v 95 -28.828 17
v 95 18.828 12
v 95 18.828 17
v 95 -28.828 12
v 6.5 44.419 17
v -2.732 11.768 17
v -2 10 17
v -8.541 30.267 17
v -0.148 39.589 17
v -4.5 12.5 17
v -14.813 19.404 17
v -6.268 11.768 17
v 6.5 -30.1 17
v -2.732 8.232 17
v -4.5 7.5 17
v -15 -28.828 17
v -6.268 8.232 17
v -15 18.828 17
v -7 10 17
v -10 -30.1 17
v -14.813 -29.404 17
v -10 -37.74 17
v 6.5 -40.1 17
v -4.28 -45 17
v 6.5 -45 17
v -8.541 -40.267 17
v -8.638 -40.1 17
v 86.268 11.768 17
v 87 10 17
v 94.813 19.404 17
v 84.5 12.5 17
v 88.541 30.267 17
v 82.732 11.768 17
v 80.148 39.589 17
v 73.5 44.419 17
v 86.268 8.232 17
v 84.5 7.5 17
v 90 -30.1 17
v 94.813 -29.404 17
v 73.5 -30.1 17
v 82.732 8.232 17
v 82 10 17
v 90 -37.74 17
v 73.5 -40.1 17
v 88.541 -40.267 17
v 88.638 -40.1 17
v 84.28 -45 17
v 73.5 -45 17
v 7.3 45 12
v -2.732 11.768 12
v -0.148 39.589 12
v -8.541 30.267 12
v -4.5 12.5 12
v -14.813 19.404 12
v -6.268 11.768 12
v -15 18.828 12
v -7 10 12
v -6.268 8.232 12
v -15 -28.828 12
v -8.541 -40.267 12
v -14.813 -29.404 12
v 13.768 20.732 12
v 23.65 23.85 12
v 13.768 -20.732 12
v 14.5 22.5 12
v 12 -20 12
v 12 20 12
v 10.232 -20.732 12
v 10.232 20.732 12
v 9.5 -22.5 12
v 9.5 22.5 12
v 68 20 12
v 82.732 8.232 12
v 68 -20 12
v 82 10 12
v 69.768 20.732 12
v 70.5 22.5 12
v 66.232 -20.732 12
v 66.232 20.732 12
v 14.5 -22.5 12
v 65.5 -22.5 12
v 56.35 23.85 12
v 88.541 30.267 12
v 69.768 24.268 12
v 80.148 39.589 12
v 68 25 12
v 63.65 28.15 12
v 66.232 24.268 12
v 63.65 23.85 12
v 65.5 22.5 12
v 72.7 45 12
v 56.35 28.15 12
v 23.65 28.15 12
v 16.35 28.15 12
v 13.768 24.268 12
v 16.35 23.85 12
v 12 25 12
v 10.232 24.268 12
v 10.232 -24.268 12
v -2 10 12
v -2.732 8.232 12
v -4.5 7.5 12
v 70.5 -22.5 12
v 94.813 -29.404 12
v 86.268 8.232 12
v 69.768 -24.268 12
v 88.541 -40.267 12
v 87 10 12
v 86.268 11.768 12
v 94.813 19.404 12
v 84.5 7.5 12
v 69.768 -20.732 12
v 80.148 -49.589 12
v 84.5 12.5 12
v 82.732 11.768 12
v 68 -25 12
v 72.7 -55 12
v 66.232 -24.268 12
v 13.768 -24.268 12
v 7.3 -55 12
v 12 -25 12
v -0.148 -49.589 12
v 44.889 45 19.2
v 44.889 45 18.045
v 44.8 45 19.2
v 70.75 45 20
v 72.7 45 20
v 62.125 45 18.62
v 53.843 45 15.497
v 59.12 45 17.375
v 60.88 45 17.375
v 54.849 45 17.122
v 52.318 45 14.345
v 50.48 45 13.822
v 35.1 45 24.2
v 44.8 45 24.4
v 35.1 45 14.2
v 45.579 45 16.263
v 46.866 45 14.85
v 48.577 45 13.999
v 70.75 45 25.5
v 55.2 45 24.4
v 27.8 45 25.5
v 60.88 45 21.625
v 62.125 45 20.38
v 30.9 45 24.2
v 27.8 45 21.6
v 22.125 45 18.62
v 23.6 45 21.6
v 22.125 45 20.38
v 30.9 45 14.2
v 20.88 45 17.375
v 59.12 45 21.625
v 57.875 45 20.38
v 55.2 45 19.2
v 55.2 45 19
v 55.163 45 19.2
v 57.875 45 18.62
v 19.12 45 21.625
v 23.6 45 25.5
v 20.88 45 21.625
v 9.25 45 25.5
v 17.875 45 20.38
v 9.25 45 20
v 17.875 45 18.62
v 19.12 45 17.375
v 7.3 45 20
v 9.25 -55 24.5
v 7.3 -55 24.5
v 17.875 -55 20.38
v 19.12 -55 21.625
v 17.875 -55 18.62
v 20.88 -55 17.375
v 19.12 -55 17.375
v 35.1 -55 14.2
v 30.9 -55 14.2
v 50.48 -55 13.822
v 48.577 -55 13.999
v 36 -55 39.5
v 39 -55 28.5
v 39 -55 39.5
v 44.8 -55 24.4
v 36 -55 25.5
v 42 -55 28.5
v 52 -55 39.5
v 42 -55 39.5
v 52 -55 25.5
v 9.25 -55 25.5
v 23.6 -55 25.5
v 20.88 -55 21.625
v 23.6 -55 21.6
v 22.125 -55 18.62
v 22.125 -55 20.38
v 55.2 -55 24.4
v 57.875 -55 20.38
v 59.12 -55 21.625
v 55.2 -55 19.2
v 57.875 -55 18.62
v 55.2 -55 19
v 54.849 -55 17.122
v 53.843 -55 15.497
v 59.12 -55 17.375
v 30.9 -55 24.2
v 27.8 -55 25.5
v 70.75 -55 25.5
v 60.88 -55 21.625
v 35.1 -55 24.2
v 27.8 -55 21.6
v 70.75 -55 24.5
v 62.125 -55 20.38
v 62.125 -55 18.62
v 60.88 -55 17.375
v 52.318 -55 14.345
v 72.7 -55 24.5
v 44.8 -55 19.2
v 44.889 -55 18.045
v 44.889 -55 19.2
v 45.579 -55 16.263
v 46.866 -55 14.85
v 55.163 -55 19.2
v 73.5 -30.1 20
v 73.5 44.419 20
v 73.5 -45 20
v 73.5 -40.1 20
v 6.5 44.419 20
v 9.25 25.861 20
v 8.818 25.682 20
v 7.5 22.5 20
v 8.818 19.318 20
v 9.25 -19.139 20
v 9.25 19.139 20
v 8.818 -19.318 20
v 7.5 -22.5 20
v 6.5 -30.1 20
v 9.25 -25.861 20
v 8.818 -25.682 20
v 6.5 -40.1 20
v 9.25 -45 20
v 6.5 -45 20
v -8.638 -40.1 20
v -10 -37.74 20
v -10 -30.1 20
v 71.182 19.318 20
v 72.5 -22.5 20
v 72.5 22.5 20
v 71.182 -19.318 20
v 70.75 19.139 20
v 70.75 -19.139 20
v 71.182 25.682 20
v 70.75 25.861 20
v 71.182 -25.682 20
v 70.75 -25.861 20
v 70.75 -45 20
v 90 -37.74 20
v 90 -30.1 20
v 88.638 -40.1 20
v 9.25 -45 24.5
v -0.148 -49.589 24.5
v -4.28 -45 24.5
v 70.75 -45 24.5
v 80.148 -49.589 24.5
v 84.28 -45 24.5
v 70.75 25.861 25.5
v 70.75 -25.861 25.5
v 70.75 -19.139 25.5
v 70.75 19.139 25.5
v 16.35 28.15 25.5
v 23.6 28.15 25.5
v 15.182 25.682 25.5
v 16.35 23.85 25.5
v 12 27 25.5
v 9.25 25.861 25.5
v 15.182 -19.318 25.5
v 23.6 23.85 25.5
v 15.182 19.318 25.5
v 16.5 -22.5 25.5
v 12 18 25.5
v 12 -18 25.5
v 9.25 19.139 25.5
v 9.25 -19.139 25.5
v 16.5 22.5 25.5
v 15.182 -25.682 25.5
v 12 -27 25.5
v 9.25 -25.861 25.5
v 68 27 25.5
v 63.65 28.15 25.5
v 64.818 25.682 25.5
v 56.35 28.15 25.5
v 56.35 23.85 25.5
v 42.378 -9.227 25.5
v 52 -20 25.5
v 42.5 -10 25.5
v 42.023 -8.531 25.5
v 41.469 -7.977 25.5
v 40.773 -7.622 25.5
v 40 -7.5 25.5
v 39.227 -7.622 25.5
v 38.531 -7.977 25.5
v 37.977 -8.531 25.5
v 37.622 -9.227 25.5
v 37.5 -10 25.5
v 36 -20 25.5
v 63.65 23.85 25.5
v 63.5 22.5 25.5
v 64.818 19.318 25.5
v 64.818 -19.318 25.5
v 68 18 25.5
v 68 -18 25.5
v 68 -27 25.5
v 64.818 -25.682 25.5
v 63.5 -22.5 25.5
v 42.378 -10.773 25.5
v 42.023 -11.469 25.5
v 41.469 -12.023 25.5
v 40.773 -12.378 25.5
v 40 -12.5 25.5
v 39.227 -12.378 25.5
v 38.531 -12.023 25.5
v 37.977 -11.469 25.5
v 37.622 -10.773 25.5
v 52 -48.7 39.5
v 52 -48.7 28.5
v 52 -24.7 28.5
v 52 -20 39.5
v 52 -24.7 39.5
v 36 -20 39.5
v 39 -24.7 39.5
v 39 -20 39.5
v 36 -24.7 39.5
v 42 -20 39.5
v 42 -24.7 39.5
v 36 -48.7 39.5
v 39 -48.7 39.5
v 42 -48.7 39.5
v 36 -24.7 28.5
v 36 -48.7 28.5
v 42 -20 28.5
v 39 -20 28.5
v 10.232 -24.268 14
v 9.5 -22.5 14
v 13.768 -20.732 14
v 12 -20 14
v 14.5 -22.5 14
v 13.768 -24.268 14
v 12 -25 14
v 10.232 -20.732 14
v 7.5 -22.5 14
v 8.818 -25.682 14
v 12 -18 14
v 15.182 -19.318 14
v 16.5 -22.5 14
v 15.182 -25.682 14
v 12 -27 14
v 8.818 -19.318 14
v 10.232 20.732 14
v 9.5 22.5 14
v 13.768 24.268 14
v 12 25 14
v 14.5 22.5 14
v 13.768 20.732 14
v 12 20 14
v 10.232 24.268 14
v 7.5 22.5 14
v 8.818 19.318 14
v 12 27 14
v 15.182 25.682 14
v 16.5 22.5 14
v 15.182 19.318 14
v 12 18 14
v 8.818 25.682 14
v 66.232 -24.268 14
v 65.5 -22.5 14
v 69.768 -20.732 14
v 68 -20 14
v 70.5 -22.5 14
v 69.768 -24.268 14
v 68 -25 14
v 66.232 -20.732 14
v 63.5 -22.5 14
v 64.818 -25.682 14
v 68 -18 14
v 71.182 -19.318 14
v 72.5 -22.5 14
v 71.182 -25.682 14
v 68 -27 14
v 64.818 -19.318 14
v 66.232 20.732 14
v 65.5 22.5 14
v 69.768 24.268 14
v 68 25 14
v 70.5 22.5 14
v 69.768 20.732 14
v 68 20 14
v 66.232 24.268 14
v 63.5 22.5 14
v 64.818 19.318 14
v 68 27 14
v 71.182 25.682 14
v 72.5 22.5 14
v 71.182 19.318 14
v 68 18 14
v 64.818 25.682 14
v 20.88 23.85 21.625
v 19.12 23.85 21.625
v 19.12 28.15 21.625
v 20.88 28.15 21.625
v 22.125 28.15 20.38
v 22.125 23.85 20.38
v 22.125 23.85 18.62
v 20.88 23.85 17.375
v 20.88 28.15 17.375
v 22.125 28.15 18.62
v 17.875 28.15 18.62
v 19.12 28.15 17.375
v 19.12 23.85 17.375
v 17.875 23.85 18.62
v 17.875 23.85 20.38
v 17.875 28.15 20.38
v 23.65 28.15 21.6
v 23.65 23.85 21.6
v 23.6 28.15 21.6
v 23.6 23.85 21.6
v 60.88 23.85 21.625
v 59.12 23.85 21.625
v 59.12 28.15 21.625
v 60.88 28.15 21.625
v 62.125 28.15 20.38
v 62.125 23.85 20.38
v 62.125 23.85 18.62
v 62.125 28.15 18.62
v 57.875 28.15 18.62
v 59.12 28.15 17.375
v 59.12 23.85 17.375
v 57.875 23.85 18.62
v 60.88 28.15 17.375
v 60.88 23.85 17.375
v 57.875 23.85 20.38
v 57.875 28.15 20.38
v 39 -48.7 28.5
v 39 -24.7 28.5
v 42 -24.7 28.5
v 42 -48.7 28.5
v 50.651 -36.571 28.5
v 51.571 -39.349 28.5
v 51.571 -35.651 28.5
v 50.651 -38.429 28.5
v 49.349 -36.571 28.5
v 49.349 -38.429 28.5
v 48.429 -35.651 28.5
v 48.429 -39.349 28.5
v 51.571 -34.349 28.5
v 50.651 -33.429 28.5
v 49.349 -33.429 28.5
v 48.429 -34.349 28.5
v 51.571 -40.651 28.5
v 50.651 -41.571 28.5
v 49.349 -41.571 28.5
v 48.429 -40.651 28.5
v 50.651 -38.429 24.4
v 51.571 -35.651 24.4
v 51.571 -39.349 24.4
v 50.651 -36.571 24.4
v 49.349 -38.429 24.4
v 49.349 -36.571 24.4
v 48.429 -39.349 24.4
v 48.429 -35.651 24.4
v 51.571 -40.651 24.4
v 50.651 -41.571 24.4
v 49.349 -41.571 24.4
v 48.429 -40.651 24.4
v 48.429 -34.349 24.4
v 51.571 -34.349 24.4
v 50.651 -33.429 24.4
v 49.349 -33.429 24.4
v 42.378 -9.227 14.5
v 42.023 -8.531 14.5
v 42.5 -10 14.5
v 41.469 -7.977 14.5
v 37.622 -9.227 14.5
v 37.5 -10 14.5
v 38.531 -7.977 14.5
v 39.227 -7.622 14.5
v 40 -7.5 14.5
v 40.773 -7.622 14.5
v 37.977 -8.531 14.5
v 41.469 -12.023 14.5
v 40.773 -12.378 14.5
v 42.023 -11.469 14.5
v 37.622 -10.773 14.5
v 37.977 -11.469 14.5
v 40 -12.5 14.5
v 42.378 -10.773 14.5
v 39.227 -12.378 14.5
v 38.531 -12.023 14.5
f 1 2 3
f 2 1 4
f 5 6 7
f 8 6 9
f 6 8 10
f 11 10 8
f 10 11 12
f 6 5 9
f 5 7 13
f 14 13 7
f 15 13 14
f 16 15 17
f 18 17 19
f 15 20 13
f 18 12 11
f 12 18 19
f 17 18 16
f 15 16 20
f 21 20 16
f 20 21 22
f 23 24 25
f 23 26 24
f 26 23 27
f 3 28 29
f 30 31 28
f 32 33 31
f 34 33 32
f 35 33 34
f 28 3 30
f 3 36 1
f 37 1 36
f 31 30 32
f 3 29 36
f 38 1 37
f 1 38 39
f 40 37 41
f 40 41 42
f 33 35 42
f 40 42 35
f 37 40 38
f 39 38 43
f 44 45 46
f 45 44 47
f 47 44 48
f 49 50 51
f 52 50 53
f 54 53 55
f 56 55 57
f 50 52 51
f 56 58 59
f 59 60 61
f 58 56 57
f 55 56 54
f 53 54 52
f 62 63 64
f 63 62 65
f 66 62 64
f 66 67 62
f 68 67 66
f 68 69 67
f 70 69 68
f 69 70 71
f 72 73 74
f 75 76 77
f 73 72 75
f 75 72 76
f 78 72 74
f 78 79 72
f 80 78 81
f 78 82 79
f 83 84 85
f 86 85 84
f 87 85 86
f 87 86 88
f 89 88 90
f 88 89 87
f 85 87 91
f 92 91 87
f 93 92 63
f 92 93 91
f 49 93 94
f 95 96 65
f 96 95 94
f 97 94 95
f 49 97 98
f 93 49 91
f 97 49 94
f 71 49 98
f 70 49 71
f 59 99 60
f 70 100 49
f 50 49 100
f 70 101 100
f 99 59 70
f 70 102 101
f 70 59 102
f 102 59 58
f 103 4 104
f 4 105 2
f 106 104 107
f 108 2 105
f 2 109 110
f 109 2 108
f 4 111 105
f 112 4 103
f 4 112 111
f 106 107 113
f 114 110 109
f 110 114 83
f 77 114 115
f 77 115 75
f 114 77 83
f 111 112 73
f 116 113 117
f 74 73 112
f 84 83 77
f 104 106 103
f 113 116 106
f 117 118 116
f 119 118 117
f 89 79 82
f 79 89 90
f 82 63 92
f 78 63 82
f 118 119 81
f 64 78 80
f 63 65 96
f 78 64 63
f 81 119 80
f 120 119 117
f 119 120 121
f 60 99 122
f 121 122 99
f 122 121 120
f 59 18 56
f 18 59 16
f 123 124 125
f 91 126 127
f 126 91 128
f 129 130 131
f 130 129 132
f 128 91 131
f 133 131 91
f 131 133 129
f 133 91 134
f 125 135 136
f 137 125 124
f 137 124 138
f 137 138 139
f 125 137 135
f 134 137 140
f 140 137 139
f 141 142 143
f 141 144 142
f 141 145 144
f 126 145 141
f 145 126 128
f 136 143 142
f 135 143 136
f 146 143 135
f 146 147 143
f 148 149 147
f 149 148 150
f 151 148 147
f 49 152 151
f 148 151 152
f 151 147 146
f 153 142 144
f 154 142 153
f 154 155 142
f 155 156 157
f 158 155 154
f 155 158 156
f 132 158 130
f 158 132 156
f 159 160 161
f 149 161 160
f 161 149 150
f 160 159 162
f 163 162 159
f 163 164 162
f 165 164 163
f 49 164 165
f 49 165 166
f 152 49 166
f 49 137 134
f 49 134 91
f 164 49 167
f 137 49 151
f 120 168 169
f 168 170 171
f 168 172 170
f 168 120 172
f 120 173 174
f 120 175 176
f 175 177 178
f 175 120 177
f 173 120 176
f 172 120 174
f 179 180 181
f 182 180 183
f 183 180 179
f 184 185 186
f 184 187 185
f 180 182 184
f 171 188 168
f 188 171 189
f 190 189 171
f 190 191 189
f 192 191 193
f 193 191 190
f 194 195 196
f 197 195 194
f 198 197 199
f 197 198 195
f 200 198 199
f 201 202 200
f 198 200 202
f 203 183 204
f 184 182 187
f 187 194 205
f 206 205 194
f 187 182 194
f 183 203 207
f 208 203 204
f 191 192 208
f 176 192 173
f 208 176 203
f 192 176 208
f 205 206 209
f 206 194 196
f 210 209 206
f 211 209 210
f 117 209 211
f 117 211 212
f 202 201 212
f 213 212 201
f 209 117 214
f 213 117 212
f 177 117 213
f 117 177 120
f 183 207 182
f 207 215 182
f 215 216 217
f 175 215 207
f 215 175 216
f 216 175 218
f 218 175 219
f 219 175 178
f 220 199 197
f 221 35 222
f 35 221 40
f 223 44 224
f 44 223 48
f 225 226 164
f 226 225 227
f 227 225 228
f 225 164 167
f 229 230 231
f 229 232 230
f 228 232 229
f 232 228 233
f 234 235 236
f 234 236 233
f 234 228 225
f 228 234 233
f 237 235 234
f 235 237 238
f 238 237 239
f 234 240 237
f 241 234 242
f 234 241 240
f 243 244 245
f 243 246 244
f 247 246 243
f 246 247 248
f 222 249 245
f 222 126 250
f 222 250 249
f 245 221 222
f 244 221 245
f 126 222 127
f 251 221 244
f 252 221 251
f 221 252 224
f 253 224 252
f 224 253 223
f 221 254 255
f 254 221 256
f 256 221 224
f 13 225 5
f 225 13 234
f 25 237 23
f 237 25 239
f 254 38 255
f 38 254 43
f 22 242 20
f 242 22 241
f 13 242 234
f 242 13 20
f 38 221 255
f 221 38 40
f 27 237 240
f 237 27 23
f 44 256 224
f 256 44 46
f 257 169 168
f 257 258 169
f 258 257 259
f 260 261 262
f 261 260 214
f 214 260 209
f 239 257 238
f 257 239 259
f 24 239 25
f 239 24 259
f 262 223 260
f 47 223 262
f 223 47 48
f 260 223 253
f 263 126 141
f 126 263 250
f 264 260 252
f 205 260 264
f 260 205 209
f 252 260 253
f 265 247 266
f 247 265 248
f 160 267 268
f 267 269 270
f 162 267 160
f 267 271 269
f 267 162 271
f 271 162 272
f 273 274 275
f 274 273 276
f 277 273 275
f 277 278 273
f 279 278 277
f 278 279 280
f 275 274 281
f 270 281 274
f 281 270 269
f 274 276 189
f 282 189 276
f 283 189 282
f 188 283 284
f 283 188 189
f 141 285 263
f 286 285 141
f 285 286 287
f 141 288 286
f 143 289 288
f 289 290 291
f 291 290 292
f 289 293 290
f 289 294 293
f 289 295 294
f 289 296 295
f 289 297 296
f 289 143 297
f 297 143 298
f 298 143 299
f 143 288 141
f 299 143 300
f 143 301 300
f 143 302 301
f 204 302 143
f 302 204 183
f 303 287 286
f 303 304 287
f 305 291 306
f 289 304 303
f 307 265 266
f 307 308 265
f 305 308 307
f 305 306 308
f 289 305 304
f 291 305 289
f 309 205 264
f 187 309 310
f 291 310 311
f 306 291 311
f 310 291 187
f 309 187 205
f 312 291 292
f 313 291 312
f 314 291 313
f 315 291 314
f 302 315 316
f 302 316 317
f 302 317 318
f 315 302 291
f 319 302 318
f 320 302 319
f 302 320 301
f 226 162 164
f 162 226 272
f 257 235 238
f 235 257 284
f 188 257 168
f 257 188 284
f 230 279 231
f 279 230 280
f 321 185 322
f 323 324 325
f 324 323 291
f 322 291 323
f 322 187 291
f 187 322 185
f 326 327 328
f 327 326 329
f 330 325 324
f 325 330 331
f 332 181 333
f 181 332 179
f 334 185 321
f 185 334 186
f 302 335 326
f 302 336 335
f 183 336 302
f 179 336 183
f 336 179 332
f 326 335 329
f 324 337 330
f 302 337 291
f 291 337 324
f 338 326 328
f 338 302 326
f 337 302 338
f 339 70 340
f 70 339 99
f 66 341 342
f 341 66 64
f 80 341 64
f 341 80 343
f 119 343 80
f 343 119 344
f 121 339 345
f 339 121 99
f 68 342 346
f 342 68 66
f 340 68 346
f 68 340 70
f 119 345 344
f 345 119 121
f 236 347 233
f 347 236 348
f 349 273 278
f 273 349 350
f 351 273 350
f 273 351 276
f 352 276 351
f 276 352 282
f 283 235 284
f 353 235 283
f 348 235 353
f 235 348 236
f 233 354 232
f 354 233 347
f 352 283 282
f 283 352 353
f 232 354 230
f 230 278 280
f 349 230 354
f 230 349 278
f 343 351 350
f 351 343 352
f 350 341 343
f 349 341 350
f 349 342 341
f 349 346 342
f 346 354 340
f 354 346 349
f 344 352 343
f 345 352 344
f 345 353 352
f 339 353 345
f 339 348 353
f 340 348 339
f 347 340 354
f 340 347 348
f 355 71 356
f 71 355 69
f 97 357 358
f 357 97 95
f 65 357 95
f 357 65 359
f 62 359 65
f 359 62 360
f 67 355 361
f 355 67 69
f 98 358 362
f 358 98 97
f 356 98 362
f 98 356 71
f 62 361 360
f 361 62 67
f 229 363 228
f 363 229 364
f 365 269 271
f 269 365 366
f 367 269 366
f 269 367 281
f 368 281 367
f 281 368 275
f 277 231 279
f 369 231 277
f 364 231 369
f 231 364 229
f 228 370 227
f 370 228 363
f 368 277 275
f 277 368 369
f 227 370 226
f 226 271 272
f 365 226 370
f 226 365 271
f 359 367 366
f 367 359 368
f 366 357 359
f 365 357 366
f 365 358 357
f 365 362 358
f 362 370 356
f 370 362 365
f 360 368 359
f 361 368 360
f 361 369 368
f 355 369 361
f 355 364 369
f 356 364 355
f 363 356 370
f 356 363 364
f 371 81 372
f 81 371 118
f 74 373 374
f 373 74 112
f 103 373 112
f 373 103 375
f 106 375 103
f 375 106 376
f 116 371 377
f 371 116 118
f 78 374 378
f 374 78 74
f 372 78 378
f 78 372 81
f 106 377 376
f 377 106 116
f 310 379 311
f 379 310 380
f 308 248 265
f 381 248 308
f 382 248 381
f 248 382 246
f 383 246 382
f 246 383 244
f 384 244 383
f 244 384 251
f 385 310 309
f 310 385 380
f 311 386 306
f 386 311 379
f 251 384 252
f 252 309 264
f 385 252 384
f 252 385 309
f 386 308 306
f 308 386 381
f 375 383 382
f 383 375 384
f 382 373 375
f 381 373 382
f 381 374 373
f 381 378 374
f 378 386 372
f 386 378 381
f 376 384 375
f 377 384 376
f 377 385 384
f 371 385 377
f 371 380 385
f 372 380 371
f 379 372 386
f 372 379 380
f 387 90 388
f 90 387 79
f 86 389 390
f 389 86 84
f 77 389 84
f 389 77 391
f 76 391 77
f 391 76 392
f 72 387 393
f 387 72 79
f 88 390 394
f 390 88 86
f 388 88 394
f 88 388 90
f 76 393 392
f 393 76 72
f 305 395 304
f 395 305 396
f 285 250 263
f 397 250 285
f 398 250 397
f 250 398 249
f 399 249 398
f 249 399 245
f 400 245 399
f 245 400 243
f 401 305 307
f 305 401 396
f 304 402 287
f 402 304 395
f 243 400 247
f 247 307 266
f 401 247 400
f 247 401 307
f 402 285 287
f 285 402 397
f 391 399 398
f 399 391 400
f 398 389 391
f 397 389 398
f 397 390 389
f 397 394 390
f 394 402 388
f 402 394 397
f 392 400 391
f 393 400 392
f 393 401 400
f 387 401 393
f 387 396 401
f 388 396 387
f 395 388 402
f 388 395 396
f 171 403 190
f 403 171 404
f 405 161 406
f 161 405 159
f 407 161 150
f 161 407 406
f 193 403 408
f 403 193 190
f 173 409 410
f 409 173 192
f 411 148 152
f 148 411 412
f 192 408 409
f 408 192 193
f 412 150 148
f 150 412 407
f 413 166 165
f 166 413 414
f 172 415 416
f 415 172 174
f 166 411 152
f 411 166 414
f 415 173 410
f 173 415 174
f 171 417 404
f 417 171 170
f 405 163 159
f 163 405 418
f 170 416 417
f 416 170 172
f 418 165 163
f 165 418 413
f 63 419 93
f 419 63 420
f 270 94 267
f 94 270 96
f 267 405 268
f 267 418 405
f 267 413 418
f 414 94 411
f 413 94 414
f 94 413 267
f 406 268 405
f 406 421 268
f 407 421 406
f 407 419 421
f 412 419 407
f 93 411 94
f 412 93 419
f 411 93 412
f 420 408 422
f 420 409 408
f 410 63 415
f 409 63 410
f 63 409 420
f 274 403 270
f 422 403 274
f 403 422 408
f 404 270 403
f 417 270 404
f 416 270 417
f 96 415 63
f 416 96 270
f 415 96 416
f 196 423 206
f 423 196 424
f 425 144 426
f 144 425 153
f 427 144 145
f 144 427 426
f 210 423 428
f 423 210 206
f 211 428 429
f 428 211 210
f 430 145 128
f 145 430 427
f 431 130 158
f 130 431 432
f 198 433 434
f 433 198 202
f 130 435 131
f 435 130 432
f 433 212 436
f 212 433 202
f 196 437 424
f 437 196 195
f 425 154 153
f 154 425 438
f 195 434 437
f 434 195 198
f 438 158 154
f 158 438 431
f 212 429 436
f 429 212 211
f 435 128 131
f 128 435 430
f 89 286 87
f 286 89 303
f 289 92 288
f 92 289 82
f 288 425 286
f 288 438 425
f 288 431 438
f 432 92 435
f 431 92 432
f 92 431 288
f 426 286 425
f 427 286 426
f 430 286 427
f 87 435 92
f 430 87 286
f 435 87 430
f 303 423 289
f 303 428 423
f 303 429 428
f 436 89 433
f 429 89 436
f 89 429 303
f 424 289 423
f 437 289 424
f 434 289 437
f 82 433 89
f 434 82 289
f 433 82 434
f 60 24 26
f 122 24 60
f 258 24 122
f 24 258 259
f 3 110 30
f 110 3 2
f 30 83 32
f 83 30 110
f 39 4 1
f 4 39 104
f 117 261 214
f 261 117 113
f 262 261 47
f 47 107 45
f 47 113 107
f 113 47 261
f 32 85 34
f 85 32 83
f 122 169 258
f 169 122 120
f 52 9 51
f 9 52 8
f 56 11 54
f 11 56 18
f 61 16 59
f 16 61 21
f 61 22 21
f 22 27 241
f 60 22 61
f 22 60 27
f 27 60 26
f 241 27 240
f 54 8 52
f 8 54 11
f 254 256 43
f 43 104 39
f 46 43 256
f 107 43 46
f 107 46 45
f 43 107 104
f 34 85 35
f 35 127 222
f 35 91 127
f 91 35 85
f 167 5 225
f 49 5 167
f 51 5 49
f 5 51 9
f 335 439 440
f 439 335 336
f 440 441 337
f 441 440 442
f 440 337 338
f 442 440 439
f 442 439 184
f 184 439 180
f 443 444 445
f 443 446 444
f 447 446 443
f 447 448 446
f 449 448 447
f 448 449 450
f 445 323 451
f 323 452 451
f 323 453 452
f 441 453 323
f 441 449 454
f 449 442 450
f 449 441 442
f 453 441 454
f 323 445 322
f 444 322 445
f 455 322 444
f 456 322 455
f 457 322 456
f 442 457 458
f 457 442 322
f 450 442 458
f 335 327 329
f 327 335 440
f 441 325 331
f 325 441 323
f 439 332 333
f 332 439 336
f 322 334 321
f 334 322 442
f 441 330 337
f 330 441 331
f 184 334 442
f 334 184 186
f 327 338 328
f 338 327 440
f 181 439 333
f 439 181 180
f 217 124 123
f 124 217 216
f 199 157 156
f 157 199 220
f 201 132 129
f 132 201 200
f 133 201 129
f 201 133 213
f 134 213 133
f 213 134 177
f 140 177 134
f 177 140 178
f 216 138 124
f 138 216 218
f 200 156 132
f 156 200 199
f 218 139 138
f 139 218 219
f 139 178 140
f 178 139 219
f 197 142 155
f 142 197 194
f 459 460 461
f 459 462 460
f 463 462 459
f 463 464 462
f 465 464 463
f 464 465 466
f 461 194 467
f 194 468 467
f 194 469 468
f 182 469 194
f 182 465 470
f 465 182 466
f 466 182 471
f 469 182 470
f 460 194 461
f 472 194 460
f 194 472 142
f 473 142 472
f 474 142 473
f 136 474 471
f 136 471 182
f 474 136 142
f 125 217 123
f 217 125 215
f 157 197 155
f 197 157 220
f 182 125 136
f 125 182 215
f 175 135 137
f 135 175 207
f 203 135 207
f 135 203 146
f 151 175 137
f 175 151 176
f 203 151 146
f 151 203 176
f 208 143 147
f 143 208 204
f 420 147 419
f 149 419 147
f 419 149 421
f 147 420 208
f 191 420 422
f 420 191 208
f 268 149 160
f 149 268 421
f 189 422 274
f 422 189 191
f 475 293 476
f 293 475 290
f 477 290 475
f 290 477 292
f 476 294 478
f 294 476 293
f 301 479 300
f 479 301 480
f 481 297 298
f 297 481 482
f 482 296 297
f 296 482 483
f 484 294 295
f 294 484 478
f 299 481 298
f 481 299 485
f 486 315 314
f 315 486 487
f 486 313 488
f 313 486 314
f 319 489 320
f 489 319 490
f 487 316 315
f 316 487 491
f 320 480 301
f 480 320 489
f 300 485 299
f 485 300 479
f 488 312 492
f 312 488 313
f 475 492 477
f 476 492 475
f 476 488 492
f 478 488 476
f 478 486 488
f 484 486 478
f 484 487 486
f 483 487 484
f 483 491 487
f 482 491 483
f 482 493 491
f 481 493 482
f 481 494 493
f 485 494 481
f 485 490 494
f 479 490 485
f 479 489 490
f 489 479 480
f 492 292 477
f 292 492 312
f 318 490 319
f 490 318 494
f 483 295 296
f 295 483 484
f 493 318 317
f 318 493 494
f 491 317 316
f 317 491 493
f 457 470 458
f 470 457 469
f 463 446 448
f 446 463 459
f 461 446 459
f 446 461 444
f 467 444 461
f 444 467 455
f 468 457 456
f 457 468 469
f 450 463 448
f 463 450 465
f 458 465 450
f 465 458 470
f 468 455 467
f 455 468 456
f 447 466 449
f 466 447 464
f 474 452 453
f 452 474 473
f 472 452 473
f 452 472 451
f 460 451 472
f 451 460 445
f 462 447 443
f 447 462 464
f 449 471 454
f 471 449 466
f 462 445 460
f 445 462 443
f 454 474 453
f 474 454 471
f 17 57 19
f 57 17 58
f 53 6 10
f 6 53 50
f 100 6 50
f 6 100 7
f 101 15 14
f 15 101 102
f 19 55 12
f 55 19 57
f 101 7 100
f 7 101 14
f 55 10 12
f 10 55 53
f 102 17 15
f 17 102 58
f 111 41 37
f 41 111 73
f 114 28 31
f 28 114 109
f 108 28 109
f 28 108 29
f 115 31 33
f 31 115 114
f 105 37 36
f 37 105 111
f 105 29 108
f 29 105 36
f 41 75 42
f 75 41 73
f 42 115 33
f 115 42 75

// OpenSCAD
// file: ymotor.scad
use <extrusions.scad>
xpos=0;
ypos=0;

module ymotor(){mirror([0,0,1])difference(){translate([0,-20,0])cube([42,75,5]);
translate([-20,20,-1])cube([42,75,8]);
#translate([21,1,0])nema17(true);
%translate([32,22,-40])rotate([90,0,90])profile8020(160);
for(j=[0,20])translate([32,30+j,2])mirror([0,0,0])rotate([0,0,360/16]){cylinder(r=2.5,h=30,center=true,$fn=8);
cylinder(r=4.5,h=30,$fn=8);
}
}
}
rotate([0,180,0])ymotor();

*translate([21.5,90,6])rotate([0,0,-90])yidler();

module yidler(){
translate([0,2.5,-16])difference(){
union(){translate([0,2,-2])cube([15,32,24],true);
translate([0,-2,5])cube([38,20,5]);
#translate([0,8,11.5])rotate([90,0,0])difference(){cube([15,5,19],true);
translate([0,-19.51,0]){translate([0,18.5,12.5])cube([31,3,21],true);
translate([0,20,15.5])cube([31,3,21],true);
translate([0,18.5,-12.5])cube([31,3,21],true);
translate([0,20,-15.5])cube([31,3,21],true);
translate([0,22.5,0])cube([31,3,21],true);
}
}

}
translate([0,-3,-4])cube([17,18,11],true);
#translate([0,-3,-1])mirror([0,0,1]){rotate([0,0,22.5])cylinder(r=2.5,h=20,center=true,$fn=8);
translate([0,0,11.6])rotate([0,0,22.5])cylinder(r=4.5,h=4,center=true,$fn=8);}

for(i=[15,30])#translate([i,10.5,18])mirror([0,0,1]){translate([0,-2.5,0])rotate([0,0,22.5])cylinder(r=2.5,h=20,center=true,$fn=8);
translate([0,-2.5,11.6])rotate([0,0,22.5])cylinder(r=4.5,h=4,center=true,$fn=8);}
}
}

module yidleranchor(){
translate([6,0,-16])difference(){
cube([30,39,19],true);
translate([7,-3,0])cube([30,39,10],true);
translate([14,-10,0])rotate([0,0,-35])cube([30,49,22],true);
for(i=[0,10])translate([i,23.7,0])rotate([90,0,0]){
translate([0,0,0])rotate([0,0,22.5])cylinder(r=2.5,h=20,center=true,$fn=8);
translate([0,0,7.6])rotate([0,0,22.5])cylinder(r=4.5,h=4,center=true,$fn=8);
}
for(i=[14,-14])translate([-17.4,i-2,-1])rotate([0,90,0]){
translate([0,0,0])rotate([0,0,22.5])cylinder(r=2.5,h=20,center=true,$fn=8);
translate([0,0,7.6])rotate([0,0,22.5])cylinder(r=4.5,h=4,center=true,$fn=8);
}

}

}



translate([0,0,7.5])rotate([0,-90,0])yidler();

*translate([120,0,3])rotate([0,-90,0])yidleranchor();
// file: extrusions.scad
module Islot5(l=100){
translate([l/2,0,0]){cube([l,5,6.6],center=true);
translate([0,0,1])hull(){
cube([l,5,4.5],center=true);
translate([0,0,-1.5])cube([l,11,1.5],center=true);
}
}
}

module rcorner(r,l){
translate([l/2,0,0])difference(){
cube([l,r*2,r*2],center=true);
for(i=[-1,1])for(j=[-1,1])translate([0,i*r,j*r])rotate([0,90,0])cylinder(r=r,h=l+1,$fn=20,center=true);
}
}


module profilex020(l=100,x=4){
xwidth=x*10;
color("beige")difference(){
translate([0,-xwidth,-10])cube([l,2*xwidth,20]);
if(x>1)for(i=[1:x-1])translate([-.5,-xwidth+i*20,0])rotate([0,90,0])cylinder(r=12.5/2,$fn=20,h=l+1);

for(i=[0:x-1])translate([-.5,-xwidth+10+i*20,0]){
rotate([0,90,0])cylinder(r=4.3/2,$fn=20,h=l+1);
translate([0,0,-6.9])Islot5(l+1);
mirror([0,0,1])translate([0,0,-6.9])Islot5(l+1);
}
for(i=[0,1])mirror([0,i,0])translate([-.5,-xwidth+3.1,0])rotate([-90,0,0])Islot5(l+1);
for(i=[-xwidth,xwidth])for(j=[-10,10])translate([-.5,i,j])rcorner(2,l+1);
}
}

module profile8020(l=100){
echo(str("profile 8020 L:",l,"mm weight:",(l*.00189),"kg"));
profilex020(l=l,x=4);
}
module profile4020(l=100){
echo(str("profile 4020 L:",l,"mm weight:",(l*.00089),"kg"));
profilex020(l=l,x=2);
}
module profile6020(l=100){
echo(str("profile 6020 L:",l,"mm weight:",(l*.00128),"kg"));
profilex020(l=l,x=3);
}
module profile2020(l=100){
echo(str("profile 2020 L:",l,"mm weight:",(l*.00049),"kg"));
profilex020(l=l,x=1);
}


module drylinn80(len=100,pos=0){
echo(str("drylin NS-01-80 L:",len,"mm weight:",(len*.00114+0.1),"kg"));
xpos=max(0,min(pos,len-80));
color("gray")difference(){
translate([0,-40,0])cube([len,80,12]);
for(i=[0:round(len/150)]){
translate([25+150*i,0,-1]){
	translate([0,20,0])cylinder(r=2,$fn=20,h=30);
	translate([0,-20,0])cylinder(r=2,$fn=20,h=30);
	translate([0,20,4.5])cylinder(r=4,$fn=20,h=30);
	translate([0,-20,4.5])cylinder(r=4,$fn=20,h=30);
	
}
}
translate([-.5,-57/2,6.5])cube([len+1,57,6]);
}
color("beige")difference(){union(){
translate([xpos,-56/2,6.1])cube([80,56,3]);
translate([xpos+6,-56/2,5.9])cube([68,56,6.1]);
}for(i=[0,56])for(j=[-22.5,22.5])translate([xpos+12+i,j,0])cylinder(r=2,$fn=20,h=15);
}

}


module drylinn27(len=80,pos=0){
//echo(str("drylin NS-01-80 L:",len,"mm weight:",(len*.00114+0.1),"kg"));
xpos=max(0,min(pos,len-20));
color("gray")difference(){
translate([0,-27/2,0])cube([len,27,9]);
translate([-.5,-27/2-.1,-.1])cube([len+1,2.76,3.3]);
translate([-.5,27/2-2.75,-.1])cube([len+1,2.76,3.3]);
for(i=[0:round(len/150)]){
translate([25+150*i,0,-1]){
	translate([0,20,0])cylinder(r=2,$fn=20,h=30);
	translate([0,-20,0])cylinder(r=2,$fn=20,h=30);
	translate([0,20,4.5])cylinder(r=4,$fn=20,h=30);
	translate([0,-20,4.5])cylinder(r=4,$fn=20,h=30);
	
}
}
translate([-.5,-16/2,6.5])cube([len+1,16,6]);
}
color("beige")difference(){union(){
translate([xpos,-16/2,6.1])cube([34,16,3]);
translate([xpos+2,-16/2+1,6.6])cube([30,14,3]);
for(i=[0,20])translate([xpos+7	+i,0,9])cylinder(r=3.2,$fn=20,h=5.5);
}
for(i=[0,20])translate([xpos+7	+i,0,2])cylinder(r=2,$fn=20,h=15.5);
}
}


drylinn27(80);

module nema17(cutout=true){
difference(){union(){translate([0,0,-48/2])cube([42,42,48],true);
translate([0,0,-1])cylinder(r=11,h=3.5);

translate([0,0,-1])cylinder(r=2.5,h=25,$fn=30);
if(cutout==true){
translate([0,0,-1])cylinder(r=12.5,h=25);
for(i=[-31/2,31/2])for(j=[-31/2,31/2]){
translate([i,j,-1])cylinder(r=2,h=12,$fn=10);
translate([i,j,10])cylinder(r=4,h=31,$fn=10);
}
}
}
if(cutout!=true){for(i=[-31/2,31/2])for(j=[-31/2,31/2]){
translate([i,j,-4])cylinder(r=2,h=11,$fn=10);
}
}
}
}


module hsnema8(cutout=true){
difference(){
union(){
translate([0,0,30.1/2])cube([20,20,30.1],center=true);
translate([0,0,30.0])cylinder(r=7.5,h=1.4);
translate([0,0,-7])cylinder(r=2.5,h=7.1,$fn=30);
translate([0,0,30.0])cylinder(r=2.5,h=7.1,$fn=30);
if(cutout==true){
translate([0,0,30.0])cylinder(r=7.7,h=11.4);
translate([0,0,-10.0])cylinder(r=7.7,h=11.4);
for(i=[-15.7/2,15.7/2])for(j=[-15.7/2,15.7/2])translate([i,j,28.2+1]){
cylinder(r=2.5/2,h=10.1,$fn=10);
translate([0,0,8])cylinder(r=5/2,h=10,$fn=10);
}
}

}
for(i=[-15.7/2,15.7/2])for(j=[-15.7/2,15.7/2])translate([i,j,28.2])if(cutout!=true){
cylinder(r=2.5/2,h=2,$fn=10);
}
if(cutout!=true){
cylinder(r=2.5/2,h=80,center=true,$fn=20);
}
}
}

hsnema8();

module nema14(cutout=true){
difference(){union(){translate([0,0,-36/2])cube([35,35,36],true);
translate([0,0,-1])cylinder(r=11,h=3.5);

translate([0,0,-1])cylinder(r=2.5,h=25,$fn=30);
if(cutout==true){
translate([0,0,-1])cylinder(r=11.5,h=25);
for(i=[-26/2,26/2])for(j=[-26/2,26/2]){
translate([i,j,-1])cylinder(r=2,h=12,$fn=10);
translate([i,j,10])cylinder(r=4,h=31,$fn=10);
}
}
}
if(cutout!=true){for(i=[-26/2,26/2])for(j=[-26/2,26/2]){
translate([i,j,-4])cylinder(r=2,h=11,$fn=10);
}
}
}
}
// main file
use <extrusions.scad>
use <ymotor.scad>

module ecylinder(r,h,$fn,ext){
cylinder(r=r,h=h,$fn=$fn);
if(ext[0]!=0){
	translate([ext[0],0,0])cylinder(r=r,h=h,$fn=$fn);
	translate([ext[0]/2,0,h/2])cube([abs(ext[0])-2*r,2*r,h],true);
}
if(ext[1]!=0){
	translate([0,ext[1],0])cylinder(r=r,h=h,$fn=$fn);
	translate([0,ext[1]/2,h/2])cube([2*r,abs(ext[1]),h],true);
}
if(ext[2]!=0){
	translate([0,0,-abs(ext[2])])cylinder(r=r,h=h+abs(ext[2]),$fn=$fn);
}
}

module advpin(){mirror([0,1,0]){
	cube([4,42,5],true);
	translate([0,20.9,0])rotate([-90,0,0])cylinder(r=1,h=44.1);}
	
}

module ycarriage(){
difference(){translate([0,-5,0])union(){
cube([110,100,5],true);
translate([0,0,3.5])cube([67,100,4],true);
translate([0,-30.1,3.5])cube([100,10,4],true);
translate([0,-45,6])cube([100,10,8],true);
translate([0,0,7.5])cube([61.5,100,7],true);
translate([4,-32.5,15])cube([16,35,20],true);

}

translate([7,-36.7,24.0])cube([36,24,20],true);
translate([0.5,-37.1,24.0])cube([3,36,20],true);

translate([10,70,4.5])rotate([90,0,0])cylinder(r=5.2,h=150);
translate([10-5.2,-80,4.7])cube([10.4,150,5.2]);
translate([-7,0,4.7])cube([4.2,150,10],true);
#translate([-14.30,0,9.7])cube([4.2,150,5.2],true);
translate([0,-10,0])cylinder(r=2.5,h=30,$fn=20);
for(i=[-28,28])for(j=[-22.5,22.5])translate([i,j,-.5])rotate([0,0,0]){cylinder(r=2.5,h=30,center=true,$fn=8);
cylinder(r=4.5,h=30,$fn=8);
}

translate([10,-40,15])rotate([0,0,360/16])cylinder(r=1.7,h=30,center=true,$fn=8);
translate([10,-35,15])rotate([0,0,360/16])cylinder(r=1.7,h=30,center=true,$fn=8);
translate([-44.5,10,-20])cylinder(r=2.5,h=30);
translate([44.5,10,-20])cylinder(r=2.5,h=30);
for(i=[-20,20])translate([i,0,5]){
rotate([90,0,0])rotate([0,0,22.5])cylinder(r=2.3,h=115,center=true,$fn=8);
translate([0,26,0])cube([7.3,4.3,20],true);
}
translate([0,-5,0])difference(){cube(120,center=true);
cylinder(r=60,h=130,center=true);
}
}
}

translate([40,0,14.5])ycarriage();

module lservox(ext=[0,0,0]){
translate(ext/2)translate([-2.25,0.7,0])cube([23+abs(ext[0]),23.7+abs(ext[1]),12.7+abs(ext[2])],true);
translate([4.6-16.9+4.6,0,0])cube([2.87,34.3,12.7],true);
translate([-23.7/2-4.95,-23.7/2+6.5,0])rotate([0,90,0])ecylinder(r=12/2,h=10,ext=ext);
translate([-23.7/2-12.95+4,-23.7/2+6.5,0])rotate([0,90,0])ecylinder(r=8.5/2,h=8.8,ext=ext);
#translate([-23.7/2-13.95-6+3.5,-23.7/2+6.5,0])rotate([0,90,0])ecylinder(r=8/2,h=4.45,ext=ext);
translate([-23.7/2-15.5+3.5,-23.7/2+6.5,0])rotate([0,90,0])ecylinder(r=21/2,h=3.5,ext=ext);
translate([-23.7/2-4.95,1,0])rotate([0,90,0])ecylinder(r=6.5/2,h=10,ext=ext);
}

module zmotor(){
	difference(){
	union(){
		translate([40,71,24])cube([32,52,4],true);
		translate([40,47,19])cube([60,4,14],true);
		translate([40,49,-21])cube([20,4,90],true);
		translate([40,52,-21])cube([4,10,90],true);
		translate([40,52+5.5,16])cube([4,10,20],true);
	}
	translate([50,47.5,17])rotate([-90,0,0])cylinder(r=5,h=30,center=true);
	translate([52,47.5,13])rotate([-90,0,0])cylinder(r=5,h=30,center=true);
	translate([30,47.5,17])rotate([-90,0,0])cylinder(r=5,h=30,center=true);
	translate([28,47.5,13])rotate([-90,0,0])cylinder(r=5,h=30,center=true);
	translate([40,80,22])nema14(true);
	for(i=[60,20])translate([i,47.5,20])rotate([-90,0,0])rotate([0,0,22.5]){cylinder(r=2.5,h=30,center=true,$fn=8);
cylinder(r=4.5,h=30,$fn=8);
}
	for(i=[-6,6])for(j=[-1,0,1])translate([40+i,47.5,12-25-j*10])rotate([-90,0,0])rotate([0,0,22.5]){cylinder(r=1.8,h=30,center=true,$fn=8);

}
#translate([40+6,47.5,12-54])rotate([-90,0,0])rotate([0,0,22.5]){cylinder(r=1.8,h=30,center=true,$fn=8);

}
#translate([40+6,47.5,12-54-22])rotate([-90,0,0])rotate([0,0,22.5]){cylinder(r=1.8,h=30,center=true,$fn=8);

}


	}
}

*zmotor();


%translate([0,43.8,0])cube(7.5,center=true);
translate(){
*translate([0,-108,-1])cube([10,68,1]);
*translate([10,-108,-1])cube([10,28,1]);
%translate([40,80,26]){translate([0,-90,0])cylinder(r=8,h=18);
hull(){
cylinder(r=7,h=18);
translate([0,-90,0])cylinder(r=7,h=18);

}
translate([0,0,-4])nema14(false);
}
%*translate([0,-50,52])cube([100,100,5]);
%translate([48.3,-36,35])rotate([0,180,180])lservox();
*translate([30+13-17.4,-14,36+2.5-14.5])advpin();
*#translate([30+13-17.4,-14-31,16])advpin();


%translate([-1.5,0,4]){translate([9.5,-58,33]){rotate([90,0,180])hsnema8(true);
translate([0,-2,0])rotate([90,0,0])cylinder(r=19/2,h=48);
}
translate([-3,-30,13]){rotate([0,0,90])drylinn27(80);
%translate([0,40,-20])cylinder(r=2.5,h=30);
}
}


*translate([80.5,0,4])mirror([1,0,0]){
translate([9.5,-58+60,33]){rotate([90,0,180])hsnema8(false);
translate([0,-2,0])rotate([90,0,0])cylinder(r=19/2,h=48);
}
translate([-4,-30,13])rotate([0,0,90])drylinn27(80);
}

}



module zcarriage(){translate([0,30,0])difference(){
union(){
translate([-3,-28,26.5])cube([21,7,21]);
translate([-10,-28,26.5])cube([10,30,5]);
translate([-10,-8,26.5])cube([40,12,5]);
translate([2,-8,26.5])cube([12,3,20]);
translate([27,-2,26.5])cube([12,6,20]);
translate([10,0,26.5])cube([8,38,5]);

}

for(i=[-3,-23])#translate([-5,i,24.5]){
cylinder(r=3.3,h=10);
translate([0,0,7.1])cylinder(r=4.4,h=18);
}

translate([33.5,-10,31])cube([1.66,100,16]);
translate([23,0.5,40])rotate([0,90,0])cylinder(r=1.7,h=12,$fn=16);

translate([-1.5,0,4])translate([9.5,-58,33])rotate([90,0,180]){hsnema8(true);
translate([0,0,45])cylinder(r=4.5,h=10);
}
}

}



*%drylinn80(160);
